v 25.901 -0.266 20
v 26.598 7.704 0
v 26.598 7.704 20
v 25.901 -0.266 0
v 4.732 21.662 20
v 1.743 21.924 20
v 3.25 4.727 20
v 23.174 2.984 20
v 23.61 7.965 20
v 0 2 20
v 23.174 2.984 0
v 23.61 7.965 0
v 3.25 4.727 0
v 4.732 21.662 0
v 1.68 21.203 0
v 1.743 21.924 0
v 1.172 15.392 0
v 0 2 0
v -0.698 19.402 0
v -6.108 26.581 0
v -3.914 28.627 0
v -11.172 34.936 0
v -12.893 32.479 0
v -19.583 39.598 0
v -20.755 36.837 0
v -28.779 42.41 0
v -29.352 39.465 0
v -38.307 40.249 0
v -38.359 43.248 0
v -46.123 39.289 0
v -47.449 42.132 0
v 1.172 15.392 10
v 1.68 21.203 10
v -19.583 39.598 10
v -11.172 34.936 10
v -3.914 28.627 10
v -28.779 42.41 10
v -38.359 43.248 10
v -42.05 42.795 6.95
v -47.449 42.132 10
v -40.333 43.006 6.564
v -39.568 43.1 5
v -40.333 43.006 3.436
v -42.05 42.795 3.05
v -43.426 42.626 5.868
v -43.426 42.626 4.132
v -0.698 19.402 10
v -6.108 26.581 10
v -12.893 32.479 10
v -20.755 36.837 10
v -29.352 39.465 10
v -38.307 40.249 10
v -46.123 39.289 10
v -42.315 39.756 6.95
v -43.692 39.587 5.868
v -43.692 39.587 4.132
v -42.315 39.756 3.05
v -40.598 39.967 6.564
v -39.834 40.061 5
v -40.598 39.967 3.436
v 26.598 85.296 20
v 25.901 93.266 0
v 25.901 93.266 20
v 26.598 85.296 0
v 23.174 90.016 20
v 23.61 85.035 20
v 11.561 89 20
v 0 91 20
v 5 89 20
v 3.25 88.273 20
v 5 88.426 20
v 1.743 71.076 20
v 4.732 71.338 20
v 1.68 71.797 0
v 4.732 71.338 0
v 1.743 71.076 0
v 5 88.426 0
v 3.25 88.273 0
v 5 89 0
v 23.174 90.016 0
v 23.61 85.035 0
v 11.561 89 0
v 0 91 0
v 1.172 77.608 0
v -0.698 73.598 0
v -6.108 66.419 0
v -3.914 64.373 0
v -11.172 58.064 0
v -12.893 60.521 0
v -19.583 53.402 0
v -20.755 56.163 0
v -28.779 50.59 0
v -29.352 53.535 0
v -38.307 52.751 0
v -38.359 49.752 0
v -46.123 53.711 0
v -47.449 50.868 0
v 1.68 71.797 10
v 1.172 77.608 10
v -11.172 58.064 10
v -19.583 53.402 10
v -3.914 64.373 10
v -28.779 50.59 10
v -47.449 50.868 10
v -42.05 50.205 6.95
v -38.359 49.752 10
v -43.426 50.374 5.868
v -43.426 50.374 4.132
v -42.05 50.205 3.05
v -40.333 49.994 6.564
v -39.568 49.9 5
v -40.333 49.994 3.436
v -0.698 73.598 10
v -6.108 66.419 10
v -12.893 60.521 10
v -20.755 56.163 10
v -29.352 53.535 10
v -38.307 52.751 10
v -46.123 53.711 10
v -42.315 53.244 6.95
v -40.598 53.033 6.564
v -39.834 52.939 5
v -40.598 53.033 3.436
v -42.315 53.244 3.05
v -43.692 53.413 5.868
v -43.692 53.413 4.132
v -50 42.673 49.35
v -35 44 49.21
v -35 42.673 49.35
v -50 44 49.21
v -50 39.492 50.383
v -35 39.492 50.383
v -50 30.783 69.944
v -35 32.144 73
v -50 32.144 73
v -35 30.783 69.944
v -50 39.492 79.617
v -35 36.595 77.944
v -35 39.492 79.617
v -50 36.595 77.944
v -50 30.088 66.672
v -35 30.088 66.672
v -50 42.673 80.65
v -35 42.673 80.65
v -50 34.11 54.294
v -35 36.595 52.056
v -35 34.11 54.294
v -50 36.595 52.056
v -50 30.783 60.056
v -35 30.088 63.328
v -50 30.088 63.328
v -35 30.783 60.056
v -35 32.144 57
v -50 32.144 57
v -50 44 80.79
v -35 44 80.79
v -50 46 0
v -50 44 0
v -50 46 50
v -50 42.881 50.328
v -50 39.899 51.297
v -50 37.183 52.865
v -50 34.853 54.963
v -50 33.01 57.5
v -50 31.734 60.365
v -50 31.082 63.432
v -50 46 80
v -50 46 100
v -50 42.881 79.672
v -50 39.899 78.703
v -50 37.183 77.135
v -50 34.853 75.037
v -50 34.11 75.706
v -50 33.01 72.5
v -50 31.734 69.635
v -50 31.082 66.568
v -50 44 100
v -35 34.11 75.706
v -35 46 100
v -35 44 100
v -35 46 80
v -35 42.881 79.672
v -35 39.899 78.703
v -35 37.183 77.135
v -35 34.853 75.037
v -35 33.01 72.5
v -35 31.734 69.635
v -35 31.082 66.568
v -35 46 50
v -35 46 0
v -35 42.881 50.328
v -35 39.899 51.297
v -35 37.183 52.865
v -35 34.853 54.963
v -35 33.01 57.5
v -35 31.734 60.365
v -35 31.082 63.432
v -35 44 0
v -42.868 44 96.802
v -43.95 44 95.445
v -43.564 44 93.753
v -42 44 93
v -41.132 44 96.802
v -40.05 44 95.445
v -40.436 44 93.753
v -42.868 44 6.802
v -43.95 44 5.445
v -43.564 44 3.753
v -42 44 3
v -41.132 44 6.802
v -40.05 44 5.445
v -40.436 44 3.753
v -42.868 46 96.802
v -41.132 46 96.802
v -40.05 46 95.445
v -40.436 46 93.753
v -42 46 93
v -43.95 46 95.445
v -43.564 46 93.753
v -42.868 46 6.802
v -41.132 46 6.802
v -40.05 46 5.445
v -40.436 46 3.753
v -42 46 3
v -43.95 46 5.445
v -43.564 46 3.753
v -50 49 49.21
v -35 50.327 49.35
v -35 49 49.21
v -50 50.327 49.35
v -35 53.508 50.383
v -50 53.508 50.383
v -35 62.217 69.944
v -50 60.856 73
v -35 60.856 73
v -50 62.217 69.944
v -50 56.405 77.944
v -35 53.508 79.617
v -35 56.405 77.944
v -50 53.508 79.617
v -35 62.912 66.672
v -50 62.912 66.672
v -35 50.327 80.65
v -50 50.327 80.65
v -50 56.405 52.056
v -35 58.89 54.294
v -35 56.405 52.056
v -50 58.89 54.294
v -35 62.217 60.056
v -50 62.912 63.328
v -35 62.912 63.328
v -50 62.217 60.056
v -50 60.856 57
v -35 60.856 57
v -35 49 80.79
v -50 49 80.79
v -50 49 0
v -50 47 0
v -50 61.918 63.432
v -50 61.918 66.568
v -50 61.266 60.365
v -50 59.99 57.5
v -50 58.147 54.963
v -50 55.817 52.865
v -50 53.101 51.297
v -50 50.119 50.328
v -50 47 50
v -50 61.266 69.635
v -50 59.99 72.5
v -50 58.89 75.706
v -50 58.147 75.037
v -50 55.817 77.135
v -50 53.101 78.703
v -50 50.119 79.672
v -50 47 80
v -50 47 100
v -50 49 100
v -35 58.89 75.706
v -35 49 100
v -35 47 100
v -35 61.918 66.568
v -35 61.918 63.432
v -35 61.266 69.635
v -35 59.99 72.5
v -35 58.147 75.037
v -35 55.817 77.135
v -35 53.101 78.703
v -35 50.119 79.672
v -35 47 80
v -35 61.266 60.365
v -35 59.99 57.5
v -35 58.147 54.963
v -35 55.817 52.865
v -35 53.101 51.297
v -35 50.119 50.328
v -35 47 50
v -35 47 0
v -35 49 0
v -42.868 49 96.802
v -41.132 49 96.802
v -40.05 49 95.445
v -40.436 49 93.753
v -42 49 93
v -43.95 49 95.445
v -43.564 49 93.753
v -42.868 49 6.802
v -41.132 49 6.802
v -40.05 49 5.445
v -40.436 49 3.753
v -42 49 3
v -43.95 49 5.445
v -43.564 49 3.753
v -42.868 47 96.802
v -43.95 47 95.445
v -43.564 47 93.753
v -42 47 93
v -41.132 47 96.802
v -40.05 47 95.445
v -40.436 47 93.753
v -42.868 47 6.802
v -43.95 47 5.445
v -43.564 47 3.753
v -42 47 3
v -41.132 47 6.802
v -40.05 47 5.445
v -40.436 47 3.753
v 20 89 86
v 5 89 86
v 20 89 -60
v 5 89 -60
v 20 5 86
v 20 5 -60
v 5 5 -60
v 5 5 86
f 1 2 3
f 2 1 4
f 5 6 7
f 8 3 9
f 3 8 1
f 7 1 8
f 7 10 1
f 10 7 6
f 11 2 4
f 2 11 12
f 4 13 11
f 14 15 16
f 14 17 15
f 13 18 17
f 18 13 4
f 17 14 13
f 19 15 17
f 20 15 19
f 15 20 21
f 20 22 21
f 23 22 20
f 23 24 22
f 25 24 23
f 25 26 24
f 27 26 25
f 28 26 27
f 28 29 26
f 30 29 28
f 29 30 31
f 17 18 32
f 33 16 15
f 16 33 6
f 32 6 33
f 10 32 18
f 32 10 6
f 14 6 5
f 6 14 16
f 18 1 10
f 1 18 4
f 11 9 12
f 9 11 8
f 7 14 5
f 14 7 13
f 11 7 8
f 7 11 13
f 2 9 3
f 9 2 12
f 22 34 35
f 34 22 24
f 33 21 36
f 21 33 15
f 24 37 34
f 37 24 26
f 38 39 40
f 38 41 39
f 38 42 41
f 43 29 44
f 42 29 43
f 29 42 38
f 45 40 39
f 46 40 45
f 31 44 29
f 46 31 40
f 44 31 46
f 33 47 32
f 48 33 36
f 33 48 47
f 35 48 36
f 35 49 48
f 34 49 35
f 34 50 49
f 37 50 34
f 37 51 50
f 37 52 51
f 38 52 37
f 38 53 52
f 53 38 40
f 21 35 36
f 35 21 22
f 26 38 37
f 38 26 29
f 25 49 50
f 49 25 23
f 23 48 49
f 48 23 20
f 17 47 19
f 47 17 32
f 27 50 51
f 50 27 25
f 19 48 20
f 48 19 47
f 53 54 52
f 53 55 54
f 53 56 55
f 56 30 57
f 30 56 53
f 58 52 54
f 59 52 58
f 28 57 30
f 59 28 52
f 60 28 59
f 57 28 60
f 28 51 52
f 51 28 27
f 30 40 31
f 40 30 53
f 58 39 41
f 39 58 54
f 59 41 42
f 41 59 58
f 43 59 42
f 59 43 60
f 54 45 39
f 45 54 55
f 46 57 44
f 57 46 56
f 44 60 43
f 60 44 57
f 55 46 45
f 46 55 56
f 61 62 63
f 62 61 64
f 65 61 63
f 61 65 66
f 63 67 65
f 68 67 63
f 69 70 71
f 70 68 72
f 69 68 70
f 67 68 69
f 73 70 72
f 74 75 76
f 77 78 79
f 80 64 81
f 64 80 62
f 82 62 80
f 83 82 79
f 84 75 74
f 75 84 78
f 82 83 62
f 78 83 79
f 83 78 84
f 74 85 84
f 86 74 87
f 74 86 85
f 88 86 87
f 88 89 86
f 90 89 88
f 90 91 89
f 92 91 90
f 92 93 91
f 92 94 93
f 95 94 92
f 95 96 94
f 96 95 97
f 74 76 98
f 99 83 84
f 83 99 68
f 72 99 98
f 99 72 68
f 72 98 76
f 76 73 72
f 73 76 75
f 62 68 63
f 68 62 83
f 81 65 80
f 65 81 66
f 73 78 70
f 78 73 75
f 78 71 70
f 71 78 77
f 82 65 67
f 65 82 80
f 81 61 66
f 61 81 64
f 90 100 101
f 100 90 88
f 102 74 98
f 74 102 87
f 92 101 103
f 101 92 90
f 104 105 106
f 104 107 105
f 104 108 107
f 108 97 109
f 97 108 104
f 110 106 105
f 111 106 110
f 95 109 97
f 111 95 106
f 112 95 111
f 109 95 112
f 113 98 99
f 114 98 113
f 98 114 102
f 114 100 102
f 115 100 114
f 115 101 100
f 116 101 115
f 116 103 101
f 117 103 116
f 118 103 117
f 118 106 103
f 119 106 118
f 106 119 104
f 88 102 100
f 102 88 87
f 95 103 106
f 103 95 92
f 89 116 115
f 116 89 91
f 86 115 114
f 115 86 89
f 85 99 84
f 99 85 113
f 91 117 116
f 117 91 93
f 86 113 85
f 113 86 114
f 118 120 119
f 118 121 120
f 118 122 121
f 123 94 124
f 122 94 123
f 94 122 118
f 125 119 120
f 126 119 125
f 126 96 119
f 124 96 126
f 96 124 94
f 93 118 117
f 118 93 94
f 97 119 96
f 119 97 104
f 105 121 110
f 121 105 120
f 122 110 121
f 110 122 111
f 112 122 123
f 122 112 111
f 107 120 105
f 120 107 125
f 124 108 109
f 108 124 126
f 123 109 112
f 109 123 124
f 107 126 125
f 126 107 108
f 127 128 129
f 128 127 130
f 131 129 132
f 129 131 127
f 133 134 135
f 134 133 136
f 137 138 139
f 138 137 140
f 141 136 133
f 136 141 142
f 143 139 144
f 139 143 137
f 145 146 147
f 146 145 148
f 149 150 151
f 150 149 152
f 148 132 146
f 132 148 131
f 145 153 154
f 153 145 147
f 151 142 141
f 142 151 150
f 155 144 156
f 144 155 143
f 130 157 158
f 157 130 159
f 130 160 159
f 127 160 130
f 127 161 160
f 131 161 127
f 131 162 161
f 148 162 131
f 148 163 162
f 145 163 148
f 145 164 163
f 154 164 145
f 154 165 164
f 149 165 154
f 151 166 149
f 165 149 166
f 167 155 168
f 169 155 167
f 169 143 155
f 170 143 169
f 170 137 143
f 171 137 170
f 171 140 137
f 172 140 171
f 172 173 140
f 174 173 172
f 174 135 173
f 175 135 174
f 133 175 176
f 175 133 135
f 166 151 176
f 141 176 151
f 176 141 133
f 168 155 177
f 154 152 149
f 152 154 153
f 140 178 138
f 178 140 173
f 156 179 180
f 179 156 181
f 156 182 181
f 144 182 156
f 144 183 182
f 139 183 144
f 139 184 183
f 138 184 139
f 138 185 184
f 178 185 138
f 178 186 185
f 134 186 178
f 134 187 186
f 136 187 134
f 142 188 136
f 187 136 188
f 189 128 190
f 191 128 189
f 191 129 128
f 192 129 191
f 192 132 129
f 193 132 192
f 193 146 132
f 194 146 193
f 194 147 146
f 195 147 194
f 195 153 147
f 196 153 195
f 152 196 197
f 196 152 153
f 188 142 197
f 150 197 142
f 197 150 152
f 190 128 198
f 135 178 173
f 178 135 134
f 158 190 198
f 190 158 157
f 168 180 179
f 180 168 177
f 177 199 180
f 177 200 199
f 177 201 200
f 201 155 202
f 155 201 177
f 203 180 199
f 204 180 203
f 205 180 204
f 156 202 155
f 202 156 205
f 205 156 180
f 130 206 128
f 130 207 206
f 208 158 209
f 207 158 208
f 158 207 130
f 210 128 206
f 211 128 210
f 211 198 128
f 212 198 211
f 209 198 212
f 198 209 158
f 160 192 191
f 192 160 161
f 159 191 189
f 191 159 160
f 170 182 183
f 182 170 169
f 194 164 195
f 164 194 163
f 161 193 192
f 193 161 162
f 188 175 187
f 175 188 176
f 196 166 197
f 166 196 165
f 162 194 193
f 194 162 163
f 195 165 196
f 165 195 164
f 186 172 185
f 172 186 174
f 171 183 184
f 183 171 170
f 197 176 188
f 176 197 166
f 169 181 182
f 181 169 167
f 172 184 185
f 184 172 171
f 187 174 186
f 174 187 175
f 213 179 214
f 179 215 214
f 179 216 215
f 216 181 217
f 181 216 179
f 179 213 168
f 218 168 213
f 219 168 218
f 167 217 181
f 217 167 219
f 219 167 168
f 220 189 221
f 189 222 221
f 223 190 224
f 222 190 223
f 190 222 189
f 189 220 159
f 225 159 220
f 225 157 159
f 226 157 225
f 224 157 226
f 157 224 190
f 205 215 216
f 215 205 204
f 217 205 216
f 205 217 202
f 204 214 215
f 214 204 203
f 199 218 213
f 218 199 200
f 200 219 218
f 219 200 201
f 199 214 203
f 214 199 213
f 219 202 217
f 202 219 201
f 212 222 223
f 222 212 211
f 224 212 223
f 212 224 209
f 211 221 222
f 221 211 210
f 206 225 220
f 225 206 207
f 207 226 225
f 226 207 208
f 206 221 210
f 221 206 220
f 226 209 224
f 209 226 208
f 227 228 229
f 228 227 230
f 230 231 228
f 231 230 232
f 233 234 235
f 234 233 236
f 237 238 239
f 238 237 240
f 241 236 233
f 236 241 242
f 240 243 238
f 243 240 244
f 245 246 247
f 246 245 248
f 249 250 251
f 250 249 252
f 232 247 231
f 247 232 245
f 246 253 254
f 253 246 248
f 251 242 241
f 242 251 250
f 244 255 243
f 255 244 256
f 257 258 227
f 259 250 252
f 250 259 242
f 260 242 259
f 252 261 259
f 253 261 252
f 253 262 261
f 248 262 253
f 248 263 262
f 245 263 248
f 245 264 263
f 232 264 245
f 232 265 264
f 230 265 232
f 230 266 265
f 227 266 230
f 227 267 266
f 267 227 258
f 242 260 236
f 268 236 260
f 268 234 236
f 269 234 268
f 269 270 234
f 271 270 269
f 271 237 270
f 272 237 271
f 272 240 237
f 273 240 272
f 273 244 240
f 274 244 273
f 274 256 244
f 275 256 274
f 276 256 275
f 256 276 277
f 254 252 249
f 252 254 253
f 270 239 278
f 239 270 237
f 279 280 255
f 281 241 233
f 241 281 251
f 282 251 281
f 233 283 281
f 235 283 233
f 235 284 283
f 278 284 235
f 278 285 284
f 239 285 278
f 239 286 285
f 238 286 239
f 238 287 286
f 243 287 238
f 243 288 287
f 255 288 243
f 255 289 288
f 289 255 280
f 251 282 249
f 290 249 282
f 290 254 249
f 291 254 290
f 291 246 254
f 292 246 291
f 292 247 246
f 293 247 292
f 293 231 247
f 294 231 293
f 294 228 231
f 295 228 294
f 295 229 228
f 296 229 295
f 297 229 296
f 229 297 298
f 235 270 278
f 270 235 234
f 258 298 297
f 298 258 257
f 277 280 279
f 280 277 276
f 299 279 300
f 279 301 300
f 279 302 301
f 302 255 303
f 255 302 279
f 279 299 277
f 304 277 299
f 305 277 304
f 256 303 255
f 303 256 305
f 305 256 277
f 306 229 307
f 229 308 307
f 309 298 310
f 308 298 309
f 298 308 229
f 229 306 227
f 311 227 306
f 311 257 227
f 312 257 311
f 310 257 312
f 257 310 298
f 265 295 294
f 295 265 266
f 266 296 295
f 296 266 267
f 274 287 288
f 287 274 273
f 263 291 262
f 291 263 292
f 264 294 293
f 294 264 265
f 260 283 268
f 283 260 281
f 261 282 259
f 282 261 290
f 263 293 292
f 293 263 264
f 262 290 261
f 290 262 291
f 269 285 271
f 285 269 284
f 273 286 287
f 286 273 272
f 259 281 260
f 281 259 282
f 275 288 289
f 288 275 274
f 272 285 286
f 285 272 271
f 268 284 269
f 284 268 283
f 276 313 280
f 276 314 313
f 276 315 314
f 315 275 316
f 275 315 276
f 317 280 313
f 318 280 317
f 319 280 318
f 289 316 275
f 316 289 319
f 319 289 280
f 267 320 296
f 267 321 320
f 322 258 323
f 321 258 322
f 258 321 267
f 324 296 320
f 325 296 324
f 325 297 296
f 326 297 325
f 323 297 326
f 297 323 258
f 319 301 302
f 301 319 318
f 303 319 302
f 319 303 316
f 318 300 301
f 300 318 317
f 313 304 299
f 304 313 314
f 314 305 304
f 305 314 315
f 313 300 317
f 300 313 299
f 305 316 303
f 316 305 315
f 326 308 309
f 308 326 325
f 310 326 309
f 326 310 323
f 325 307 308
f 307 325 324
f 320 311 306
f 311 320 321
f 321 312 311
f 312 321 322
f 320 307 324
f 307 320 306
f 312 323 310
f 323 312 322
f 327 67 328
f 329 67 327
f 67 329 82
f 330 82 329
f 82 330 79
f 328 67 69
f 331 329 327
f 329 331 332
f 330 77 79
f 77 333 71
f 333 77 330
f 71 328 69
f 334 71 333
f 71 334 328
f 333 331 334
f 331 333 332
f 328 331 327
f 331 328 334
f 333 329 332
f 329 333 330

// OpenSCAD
// file: telescope_mount1.scad
module telescope_mount() {
	difference() {
		union() {
			difference() {
				union() {
					cylinder(h = 15, r=16, center=false);
					translate([-35,-2,0]) cube([100,20,15]);
				}
				translate([0,0,-5]) cylinder(h = 25, r=15, center=false);
			}
		
		}
	
		translate([-50,0,-10]) cube([200,40,40]);
		// bolt hole
		translate([-30,-10,8]) rotate([90,0,0]) cylinder(h=30,r=2, center=true);
		translate([60,-10,8]) rotate([90,0,0]) cylinder(h=30,r=2, center=true);
	}
}


//telescope_mount();
// file: phone_grip1.scad
/*

	Arm/Gripper to hold phone (in a case) for telescope mount

*/

module gripper() {
	difference() {
		cube([26,20,20]);
		translate([3,3,-4]) cube([20,30,30]);
		translate([10,8,-4]) cube([20,20,30]);
	}
}




module arm() {
	difference() {
		difference() {
			cylinder(h = 10, r=46, center=false);
			translate([0,0,-5]) cylinder(h = 20, r=43, center=false);
		}

		translate([-50,-80,-10]) cube([60,90,40]);
		translate([0,-50,-10]) cube([60,190,40]);
	}

	
}


module phone_gripper_arm() {
	gripper();
	difference() {
		translate([-37,-8,0]) rotate([0,0,300]) arm();
		// bolt hole
		translate([-45,30,5]) rotate([90,0,0]) cylinder(h=30,r=2, center=true);

	}
}	


//phone_gripper_arm();
// main file
/*

	Arm/Gripper to hold phone (in a case) for telescope mount

*/

include <phone_grip1.scad>;
include <telescope_mount1.scad>;


translate([0,2,0]) rotate([0,0,-5]) phone_gripper_arm();
 mirror([0,1,0]) translate([0,-91,0]) rotate([0,0,-5]) phone_gripper_arm();

color("Blue",0.5) translate([5,5,-60]) rotate([90,0,90]) cube([84,146,15]);

rotate([0,90,0]) translate([-65,46,-50]) telescope_mount();
mirror([0,1,0]) rotate([0,90,0]) translate([-65,-47,-50]) telescope_mount();
